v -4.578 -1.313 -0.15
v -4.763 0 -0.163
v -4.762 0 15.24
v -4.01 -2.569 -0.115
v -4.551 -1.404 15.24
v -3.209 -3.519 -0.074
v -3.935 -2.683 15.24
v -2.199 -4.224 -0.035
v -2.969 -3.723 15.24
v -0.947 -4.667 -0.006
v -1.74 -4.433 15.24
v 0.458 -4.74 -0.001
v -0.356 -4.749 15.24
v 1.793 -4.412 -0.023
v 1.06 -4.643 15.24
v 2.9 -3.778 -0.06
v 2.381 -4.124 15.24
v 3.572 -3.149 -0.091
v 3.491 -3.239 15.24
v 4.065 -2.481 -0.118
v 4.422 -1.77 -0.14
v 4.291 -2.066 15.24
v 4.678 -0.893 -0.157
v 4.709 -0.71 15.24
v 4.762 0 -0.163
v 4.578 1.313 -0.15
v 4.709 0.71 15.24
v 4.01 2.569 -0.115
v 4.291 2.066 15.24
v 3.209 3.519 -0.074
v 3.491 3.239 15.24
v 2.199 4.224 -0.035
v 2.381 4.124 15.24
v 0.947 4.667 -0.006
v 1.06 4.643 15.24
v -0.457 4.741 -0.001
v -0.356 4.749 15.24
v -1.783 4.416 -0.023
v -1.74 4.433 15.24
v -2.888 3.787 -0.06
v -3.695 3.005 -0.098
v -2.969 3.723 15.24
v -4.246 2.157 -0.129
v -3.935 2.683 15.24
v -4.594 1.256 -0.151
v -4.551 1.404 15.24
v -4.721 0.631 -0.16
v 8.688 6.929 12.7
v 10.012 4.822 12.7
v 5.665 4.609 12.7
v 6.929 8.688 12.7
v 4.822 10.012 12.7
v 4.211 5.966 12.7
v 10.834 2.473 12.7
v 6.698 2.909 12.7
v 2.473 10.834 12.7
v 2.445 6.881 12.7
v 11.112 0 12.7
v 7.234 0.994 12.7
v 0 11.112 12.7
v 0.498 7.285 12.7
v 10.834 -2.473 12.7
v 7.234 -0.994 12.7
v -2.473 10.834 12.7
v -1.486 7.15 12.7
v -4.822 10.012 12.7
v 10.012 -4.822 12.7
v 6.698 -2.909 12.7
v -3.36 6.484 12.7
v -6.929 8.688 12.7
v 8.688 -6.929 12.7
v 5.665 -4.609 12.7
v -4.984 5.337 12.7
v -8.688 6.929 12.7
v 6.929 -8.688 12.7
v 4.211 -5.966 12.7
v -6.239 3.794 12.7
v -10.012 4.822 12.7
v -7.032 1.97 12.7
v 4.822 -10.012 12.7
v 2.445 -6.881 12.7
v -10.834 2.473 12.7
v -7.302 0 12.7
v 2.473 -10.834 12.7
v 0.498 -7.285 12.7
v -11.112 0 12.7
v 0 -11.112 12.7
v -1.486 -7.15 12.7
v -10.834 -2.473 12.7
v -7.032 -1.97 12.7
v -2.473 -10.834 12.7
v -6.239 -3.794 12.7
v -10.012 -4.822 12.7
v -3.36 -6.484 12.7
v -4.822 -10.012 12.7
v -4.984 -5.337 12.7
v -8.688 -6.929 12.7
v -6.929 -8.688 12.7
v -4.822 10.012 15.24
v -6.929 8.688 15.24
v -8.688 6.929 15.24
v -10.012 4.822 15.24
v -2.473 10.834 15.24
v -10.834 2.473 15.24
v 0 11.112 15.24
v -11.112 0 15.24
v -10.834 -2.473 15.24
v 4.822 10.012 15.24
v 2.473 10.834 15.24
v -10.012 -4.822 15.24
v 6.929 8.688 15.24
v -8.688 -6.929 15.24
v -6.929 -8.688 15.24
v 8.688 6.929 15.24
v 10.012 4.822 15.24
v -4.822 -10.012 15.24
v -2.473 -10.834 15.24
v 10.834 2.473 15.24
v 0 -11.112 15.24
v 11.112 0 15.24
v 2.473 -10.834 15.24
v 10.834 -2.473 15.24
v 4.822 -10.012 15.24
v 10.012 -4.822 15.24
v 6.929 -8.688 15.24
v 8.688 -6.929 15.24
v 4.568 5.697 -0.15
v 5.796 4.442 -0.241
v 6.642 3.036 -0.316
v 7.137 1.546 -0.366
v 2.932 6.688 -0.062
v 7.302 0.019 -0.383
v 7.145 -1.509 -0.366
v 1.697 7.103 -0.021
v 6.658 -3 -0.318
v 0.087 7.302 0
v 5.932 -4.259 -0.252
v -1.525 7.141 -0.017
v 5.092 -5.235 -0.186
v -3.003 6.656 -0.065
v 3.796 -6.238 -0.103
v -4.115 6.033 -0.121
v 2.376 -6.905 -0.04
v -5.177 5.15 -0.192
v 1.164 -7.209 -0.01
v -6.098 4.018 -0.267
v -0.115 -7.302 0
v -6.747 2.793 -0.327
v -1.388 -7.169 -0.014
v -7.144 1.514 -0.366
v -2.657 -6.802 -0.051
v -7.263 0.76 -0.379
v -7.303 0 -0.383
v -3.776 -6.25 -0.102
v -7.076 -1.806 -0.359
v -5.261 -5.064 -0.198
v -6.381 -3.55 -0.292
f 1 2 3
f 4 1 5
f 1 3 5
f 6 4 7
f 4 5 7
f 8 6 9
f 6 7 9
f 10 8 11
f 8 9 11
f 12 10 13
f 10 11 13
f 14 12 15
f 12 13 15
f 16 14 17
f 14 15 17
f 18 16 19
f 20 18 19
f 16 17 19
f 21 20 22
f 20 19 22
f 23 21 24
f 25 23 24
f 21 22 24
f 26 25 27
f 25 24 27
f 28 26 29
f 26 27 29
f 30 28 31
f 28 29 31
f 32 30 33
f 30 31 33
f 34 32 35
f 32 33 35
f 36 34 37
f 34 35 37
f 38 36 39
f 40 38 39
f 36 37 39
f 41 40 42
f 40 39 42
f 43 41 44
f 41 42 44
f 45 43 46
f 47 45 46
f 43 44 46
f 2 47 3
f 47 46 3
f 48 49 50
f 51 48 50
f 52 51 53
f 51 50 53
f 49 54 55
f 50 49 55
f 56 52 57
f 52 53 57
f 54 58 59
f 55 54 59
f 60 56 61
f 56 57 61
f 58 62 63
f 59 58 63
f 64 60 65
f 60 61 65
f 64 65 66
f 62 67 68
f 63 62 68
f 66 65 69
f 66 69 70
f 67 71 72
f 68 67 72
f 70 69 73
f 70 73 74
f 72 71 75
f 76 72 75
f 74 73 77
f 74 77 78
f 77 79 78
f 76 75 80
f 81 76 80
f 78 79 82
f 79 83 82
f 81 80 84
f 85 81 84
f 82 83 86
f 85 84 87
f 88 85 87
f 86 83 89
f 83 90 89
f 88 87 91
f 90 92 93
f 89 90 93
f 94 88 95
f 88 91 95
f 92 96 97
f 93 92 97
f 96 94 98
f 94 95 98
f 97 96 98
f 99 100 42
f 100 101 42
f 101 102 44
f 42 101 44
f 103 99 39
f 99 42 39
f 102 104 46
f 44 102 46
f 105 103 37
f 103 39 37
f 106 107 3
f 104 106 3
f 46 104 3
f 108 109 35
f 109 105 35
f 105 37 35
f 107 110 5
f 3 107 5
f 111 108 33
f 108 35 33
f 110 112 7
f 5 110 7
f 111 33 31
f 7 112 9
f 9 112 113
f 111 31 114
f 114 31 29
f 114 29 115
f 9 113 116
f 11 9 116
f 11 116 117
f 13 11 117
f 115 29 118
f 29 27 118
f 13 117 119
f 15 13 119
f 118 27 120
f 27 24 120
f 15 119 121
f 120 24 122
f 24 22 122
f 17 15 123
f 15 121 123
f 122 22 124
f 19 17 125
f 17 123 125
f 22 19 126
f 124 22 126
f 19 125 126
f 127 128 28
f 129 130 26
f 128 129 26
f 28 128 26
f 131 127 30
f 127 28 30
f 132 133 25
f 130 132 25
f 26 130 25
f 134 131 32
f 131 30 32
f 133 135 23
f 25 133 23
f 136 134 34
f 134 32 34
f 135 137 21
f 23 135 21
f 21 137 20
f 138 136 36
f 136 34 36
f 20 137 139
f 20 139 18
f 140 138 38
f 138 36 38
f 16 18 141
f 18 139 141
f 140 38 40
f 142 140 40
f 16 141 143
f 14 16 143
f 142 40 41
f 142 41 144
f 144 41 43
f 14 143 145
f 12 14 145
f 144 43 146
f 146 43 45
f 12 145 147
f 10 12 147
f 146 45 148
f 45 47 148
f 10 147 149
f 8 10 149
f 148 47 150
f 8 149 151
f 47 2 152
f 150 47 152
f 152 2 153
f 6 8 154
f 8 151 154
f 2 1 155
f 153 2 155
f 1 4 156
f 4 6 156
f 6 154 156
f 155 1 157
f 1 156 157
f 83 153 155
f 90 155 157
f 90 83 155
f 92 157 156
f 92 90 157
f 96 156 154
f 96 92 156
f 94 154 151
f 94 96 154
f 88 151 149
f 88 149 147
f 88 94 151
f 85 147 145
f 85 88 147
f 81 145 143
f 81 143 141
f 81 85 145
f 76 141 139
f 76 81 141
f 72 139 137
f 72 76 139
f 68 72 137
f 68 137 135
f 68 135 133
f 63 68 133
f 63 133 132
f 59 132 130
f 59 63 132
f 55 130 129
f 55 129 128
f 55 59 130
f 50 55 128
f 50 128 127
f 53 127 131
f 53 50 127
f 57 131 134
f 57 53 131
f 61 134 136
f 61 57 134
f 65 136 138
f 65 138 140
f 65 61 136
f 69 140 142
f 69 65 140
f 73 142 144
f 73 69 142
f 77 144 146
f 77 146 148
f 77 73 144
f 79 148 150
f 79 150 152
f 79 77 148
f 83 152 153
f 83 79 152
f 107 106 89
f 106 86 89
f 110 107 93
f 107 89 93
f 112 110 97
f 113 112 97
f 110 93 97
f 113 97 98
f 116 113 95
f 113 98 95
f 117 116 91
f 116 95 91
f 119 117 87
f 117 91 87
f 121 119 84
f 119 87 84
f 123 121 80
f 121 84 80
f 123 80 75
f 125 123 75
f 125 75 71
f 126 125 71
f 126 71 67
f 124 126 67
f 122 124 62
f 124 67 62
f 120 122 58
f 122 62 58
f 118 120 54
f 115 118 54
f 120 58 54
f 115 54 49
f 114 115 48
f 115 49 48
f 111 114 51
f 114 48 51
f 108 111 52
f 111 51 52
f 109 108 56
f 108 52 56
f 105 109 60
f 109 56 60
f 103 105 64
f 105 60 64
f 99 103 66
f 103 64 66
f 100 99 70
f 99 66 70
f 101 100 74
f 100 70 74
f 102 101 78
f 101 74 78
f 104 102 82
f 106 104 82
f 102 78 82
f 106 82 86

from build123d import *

# Parameters (mm, degrees)
F0_W          = 2.54
F0_H          = 12.7
F3_DEPTH      = 25.4
F2_R          = 69.85
F4_DEPTH      = 25.4
F4_DEPTH_BACK = 25.4


with BuildPart() as f1:
    # F0 (on Front) → F1 (revolve)
    with BuildSketch(Plane.XZ):
        with Locations((-6.0325, 6.35)):
            Rectangle(F0_W, F0_H)
        Polygon((-7.3025, 12.7), (-4.7625, 12.7), (-4.7625, 15.24), (-11.1125, 15.24), (-11.1125, 12.7), align=None)
    revolve(axis=Axis((0, 0, 2.0128042901), (0, 0, 1)))

    # F3 (add): a face of the model
    f3_faces = [f1.faces().sort_by_distance(p)[0] for p in [
        (7.0959541092, 0, 0),
    ]]
    extrude(f3_faces, amount=F3_DEPTH)

    # F2 (on Front) → F4 (cut, two sides)
    with BuildSketch(Plane.XZ) as f4_sk:
        with Locations((0, -69.85)):
            Circle(F2_R)
    extrude(amount=-F4_DEPTH, mode=Mode.SUBTRACT)
    extrude(f4_sk.sketch, amount=F4_DEPTH_BACK, mode=Mode.SUBTRACT)


solid = f1.part
